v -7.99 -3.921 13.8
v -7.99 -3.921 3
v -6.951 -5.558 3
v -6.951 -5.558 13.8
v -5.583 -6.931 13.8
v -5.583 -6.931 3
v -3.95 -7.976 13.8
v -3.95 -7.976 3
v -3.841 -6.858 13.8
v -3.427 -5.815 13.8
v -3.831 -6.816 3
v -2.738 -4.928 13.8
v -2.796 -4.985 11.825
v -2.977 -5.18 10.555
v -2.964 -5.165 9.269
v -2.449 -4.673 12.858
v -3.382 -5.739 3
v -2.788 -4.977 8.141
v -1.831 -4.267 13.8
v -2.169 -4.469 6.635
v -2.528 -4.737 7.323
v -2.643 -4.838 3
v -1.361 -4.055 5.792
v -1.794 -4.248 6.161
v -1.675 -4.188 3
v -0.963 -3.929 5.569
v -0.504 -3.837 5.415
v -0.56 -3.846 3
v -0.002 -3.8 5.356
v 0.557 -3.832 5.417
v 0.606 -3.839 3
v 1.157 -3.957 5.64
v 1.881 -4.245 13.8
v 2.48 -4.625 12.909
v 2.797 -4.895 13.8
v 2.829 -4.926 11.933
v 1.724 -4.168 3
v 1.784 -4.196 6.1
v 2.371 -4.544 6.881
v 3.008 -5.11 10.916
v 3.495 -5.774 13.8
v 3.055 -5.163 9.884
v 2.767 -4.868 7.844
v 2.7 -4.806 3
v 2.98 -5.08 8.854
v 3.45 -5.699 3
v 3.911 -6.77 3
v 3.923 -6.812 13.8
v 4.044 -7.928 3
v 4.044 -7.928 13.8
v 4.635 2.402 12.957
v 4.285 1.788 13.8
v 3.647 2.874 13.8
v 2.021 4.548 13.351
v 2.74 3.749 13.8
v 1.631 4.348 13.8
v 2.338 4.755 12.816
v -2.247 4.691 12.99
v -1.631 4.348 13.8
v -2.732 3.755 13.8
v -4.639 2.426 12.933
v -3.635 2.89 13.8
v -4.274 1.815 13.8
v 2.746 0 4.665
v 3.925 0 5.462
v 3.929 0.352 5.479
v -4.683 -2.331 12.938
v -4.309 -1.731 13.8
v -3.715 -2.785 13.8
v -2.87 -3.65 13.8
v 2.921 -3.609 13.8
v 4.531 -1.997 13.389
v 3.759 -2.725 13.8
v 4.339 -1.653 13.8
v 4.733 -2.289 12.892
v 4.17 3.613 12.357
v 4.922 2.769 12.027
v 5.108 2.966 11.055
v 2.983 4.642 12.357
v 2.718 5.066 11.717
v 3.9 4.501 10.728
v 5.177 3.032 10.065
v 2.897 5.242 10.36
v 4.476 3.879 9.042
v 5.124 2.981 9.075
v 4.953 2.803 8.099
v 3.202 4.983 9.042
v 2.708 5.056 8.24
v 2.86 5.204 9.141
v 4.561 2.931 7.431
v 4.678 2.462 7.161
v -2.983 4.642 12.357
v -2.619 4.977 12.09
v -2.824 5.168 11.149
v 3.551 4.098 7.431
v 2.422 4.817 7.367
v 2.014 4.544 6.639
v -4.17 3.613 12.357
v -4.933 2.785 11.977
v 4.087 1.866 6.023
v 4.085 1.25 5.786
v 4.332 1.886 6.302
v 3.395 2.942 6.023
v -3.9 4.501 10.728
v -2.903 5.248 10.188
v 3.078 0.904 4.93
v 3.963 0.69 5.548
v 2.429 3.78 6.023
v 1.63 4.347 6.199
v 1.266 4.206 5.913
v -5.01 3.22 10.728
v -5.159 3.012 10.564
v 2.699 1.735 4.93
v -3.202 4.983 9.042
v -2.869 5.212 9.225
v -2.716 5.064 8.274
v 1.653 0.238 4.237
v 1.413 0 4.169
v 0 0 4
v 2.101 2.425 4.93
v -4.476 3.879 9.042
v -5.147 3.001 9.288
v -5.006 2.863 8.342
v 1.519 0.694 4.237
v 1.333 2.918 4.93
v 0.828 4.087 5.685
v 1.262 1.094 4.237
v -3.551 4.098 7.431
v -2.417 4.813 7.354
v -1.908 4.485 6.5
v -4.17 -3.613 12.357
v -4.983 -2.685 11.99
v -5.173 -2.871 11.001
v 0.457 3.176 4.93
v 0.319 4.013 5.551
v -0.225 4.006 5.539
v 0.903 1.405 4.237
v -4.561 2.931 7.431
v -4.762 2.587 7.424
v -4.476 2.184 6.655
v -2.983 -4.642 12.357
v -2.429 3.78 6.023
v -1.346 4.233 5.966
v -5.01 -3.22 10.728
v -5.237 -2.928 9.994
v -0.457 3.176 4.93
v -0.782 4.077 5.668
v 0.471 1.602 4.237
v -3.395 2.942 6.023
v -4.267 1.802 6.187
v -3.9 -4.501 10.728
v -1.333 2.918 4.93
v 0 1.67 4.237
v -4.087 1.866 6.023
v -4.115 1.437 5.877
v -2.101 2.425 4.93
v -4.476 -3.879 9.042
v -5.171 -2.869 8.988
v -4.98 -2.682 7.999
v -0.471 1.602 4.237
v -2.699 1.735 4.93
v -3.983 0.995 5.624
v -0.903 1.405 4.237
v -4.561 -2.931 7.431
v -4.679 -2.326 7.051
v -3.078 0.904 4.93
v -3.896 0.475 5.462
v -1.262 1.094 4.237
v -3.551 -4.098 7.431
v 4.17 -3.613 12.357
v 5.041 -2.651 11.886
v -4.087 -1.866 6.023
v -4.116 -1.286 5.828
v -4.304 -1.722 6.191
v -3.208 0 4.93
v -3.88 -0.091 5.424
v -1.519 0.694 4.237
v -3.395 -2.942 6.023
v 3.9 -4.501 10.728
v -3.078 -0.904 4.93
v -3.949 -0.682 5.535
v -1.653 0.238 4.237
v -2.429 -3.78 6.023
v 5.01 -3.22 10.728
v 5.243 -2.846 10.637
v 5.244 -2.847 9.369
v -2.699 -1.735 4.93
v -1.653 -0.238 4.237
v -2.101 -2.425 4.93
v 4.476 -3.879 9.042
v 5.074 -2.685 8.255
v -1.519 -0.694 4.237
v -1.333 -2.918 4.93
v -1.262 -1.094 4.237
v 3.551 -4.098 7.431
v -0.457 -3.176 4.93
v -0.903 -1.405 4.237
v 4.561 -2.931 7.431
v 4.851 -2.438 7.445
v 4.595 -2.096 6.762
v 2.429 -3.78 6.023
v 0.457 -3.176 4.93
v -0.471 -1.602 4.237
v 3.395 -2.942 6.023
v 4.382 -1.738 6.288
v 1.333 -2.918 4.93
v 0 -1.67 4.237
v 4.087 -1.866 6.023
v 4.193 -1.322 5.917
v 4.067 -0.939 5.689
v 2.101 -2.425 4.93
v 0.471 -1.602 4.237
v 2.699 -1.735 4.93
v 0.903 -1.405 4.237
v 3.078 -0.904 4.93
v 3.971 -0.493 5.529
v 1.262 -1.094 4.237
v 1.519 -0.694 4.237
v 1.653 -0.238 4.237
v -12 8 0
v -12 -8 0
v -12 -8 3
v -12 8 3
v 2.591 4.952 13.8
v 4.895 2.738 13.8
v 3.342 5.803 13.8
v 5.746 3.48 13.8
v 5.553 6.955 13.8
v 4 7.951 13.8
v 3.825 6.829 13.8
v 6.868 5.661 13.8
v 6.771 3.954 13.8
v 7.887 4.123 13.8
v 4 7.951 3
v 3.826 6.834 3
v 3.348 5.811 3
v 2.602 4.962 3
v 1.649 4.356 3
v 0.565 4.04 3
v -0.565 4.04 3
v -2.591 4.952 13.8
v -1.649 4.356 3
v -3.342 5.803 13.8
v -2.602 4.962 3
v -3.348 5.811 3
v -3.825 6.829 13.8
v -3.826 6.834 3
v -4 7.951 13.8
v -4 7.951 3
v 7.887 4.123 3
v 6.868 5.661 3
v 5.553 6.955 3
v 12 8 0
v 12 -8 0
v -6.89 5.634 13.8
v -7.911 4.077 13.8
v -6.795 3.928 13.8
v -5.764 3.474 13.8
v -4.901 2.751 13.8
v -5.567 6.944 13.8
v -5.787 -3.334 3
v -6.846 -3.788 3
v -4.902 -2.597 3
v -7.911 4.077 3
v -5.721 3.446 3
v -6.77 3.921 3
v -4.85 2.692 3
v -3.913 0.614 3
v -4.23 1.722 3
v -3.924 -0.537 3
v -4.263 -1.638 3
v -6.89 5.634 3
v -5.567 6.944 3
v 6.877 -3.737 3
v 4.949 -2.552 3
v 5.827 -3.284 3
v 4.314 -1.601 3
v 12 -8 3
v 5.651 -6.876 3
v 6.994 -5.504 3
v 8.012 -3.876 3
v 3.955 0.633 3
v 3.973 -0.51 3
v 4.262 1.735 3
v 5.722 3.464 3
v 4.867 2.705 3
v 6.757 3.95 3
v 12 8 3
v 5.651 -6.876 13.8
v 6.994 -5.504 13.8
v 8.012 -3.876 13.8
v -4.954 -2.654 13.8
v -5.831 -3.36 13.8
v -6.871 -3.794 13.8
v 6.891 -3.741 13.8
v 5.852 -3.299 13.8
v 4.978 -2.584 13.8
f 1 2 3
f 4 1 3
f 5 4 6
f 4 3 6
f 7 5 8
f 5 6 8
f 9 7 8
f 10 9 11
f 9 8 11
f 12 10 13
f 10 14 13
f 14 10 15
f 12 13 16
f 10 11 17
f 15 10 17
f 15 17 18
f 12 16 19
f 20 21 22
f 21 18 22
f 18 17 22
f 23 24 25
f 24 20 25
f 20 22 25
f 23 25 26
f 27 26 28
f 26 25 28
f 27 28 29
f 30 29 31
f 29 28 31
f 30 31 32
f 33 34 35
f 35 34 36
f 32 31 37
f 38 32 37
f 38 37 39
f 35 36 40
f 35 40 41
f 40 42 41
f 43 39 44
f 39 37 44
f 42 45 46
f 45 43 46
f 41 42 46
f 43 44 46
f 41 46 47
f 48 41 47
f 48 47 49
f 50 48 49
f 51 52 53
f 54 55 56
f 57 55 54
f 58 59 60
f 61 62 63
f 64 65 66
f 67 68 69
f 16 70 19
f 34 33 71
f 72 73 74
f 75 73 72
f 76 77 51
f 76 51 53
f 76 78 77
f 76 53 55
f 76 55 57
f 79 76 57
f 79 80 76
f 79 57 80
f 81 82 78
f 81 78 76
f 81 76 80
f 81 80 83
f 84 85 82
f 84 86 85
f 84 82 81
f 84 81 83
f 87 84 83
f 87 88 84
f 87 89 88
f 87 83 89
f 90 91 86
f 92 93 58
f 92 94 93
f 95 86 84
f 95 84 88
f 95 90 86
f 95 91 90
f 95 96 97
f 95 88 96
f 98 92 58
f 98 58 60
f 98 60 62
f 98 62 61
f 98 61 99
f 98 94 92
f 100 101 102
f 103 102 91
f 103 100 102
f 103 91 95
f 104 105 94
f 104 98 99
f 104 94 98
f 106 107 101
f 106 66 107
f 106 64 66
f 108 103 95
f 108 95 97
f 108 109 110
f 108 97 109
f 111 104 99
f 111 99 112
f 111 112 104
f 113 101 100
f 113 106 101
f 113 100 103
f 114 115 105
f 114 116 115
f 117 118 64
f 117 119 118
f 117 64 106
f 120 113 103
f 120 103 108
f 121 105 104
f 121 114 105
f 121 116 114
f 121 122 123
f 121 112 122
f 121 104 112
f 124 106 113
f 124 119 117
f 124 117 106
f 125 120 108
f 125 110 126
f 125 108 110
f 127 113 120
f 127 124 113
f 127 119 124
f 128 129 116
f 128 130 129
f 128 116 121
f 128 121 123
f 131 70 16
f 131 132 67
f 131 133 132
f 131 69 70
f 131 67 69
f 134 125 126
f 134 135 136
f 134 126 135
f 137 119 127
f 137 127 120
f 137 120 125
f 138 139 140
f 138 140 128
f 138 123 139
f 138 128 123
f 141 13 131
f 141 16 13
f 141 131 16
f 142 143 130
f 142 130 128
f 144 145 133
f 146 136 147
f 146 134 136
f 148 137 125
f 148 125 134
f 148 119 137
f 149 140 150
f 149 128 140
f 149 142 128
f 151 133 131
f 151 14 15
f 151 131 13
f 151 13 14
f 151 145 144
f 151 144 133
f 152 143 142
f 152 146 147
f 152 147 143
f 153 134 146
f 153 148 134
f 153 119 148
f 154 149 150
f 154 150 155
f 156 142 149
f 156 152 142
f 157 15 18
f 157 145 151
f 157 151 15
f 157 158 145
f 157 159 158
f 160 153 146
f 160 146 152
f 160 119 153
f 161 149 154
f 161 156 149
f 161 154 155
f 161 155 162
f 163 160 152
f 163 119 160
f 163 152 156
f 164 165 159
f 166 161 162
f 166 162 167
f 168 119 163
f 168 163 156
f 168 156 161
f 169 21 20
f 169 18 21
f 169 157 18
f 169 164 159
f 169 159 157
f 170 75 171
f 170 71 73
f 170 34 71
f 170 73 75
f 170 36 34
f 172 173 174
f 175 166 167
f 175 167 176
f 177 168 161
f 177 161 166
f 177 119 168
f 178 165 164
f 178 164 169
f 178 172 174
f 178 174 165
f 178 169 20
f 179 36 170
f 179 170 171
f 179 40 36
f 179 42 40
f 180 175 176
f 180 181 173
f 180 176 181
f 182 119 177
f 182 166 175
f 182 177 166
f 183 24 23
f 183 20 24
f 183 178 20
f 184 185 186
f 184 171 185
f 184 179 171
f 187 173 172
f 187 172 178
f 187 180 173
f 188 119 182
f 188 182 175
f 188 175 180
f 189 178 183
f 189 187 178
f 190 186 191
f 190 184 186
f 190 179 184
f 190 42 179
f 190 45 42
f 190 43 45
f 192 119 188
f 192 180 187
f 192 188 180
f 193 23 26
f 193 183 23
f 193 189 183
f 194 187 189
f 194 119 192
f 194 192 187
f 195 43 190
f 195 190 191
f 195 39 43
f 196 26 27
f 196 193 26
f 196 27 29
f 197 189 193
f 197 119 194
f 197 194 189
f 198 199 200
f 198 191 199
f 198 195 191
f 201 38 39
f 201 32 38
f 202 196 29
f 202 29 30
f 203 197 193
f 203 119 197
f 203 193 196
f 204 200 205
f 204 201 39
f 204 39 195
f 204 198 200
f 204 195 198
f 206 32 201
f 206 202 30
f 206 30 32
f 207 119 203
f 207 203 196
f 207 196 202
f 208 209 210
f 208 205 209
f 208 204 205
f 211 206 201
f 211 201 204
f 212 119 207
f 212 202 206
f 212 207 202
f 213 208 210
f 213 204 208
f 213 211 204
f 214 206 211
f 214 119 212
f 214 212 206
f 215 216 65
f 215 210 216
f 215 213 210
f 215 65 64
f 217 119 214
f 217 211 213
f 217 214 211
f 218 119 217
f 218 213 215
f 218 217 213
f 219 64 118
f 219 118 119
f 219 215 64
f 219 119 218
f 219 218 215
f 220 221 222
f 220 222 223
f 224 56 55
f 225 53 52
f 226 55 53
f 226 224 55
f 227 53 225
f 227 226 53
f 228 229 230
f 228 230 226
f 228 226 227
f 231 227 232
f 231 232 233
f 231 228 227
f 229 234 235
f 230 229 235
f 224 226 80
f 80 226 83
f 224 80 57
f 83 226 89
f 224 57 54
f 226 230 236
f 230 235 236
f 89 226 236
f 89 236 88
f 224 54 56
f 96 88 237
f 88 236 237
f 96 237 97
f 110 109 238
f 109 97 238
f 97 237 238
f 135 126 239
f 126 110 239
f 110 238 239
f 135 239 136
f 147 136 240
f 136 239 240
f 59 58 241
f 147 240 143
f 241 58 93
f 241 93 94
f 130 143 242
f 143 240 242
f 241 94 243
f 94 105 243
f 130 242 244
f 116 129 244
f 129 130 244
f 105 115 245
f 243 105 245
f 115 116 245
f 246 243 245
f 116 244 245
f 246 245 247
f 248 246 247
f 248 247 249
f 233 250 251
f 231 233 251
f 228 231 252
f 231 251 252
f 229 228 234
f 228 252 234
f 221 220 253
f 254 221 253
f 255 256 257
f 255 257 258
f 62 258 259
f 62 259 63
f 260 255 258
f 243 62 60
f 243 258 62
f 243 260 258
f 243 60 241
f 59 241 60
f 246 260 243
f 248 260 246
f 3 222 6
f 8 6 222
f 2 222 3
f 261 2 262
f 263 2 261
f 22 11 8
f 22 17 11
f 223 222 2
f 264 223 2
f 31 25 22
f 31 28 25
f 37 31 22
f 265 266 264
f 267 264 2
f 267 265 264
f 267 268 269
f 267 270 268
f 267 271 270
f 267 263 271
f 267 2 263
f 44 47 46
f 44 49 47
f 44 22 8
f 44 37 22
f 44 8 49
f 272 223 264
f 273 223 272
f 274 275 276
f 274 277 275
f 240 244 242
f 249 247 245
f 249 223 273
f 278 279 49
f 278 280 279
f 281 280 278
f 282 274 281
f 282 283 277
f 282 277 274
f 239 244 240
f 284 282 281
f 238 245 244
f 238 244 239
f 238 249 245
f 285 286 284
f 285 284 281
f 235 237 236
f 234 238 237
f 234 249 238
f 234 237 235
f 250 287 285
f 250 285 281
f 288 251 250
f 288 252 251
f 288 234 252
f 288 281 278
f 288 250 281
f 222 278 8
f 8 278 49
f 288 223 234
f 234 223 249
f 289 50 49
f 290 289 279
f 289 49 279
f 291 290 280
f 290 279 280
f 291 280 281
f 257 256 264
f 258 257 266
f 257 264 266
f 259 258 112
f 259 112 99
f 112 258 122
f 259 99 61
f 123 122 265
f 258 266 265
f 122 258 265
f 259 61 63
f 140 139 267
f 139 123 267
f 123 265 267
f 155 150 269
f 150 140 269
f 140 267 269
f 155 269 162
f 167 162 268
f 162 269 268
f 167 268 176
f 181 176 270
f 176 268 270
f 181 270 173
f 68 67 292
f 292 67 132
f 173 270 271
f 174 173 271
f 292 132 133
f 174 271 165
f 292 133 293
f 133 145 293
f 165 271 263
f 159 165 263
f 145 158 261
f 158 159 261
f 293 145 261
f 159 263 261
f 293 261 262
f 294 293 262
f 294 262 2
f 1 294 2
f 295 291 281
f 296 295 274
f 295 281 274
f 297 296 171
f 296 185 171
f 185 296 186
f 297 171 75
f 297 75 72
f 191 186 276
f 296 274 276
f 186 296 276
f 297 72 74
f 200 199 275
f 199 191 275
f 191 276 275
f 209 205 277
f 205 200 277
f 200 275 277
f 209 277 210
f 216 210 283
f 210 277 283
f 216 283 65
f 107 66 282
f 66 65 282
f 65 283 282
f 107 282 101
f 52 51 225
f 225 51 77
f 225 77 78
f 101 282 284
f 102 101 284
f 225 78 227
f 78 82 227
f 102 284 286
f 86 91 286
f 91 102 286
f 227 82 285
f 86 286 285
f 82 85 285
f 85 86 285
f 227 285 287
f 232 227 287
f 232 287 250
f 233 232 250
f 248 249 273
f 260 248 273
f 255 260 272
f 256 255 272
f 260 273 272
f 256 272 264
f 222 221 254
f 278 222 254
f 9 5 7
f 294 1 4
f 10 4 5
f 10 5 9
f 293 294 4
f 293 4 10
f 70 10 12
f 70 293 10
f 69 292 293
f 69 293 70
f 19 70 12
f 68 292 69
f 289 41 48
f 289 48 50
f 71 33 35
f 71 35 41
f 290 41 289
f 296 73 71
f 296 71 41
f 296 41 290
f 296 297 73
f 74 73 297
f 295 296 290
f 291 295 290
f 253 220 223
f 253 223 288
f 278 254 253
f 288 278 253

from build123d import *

# Parameters (mm, degrees)
SKIZZE1_W                       = 24
SKIZZE1_H                       = 16
AUFSATZ_LINEAR_AUSTRAGEN1_DEPTH = 3
AUFSATZ_LINEAR_AUSTRAGEN2_DEPTH = 10.8


with BuildPart() as part:
    # Skizze1 → Aufsatz-Linear austragen1 (new body)
    with BuildSketch(Plane.XY):
        Rectangle(SKIZZE1_W, SKIZZE1_H)
    extrude(amount=AUFSATZ_LINEAR_AUSTRAGEN1_DEPTH)

    # Skizze2 → Aufsatz-Linear austragen2 (add)
    with BuildSketch(Plane.XY.offset(3)):
        with BuildLine():
            ThreePointArc((-3.999695252, 7.950625), (-6.26249607, 6.323855072), (-7.911250653, 4.077022578))
            ThreePointArc((-7.911250653, 4.077022578), (-3.876728126, 0.037983649), (-7.989616413, -3.92122807))
            ThreePointArc((-7.989616413, -3.92122807), (-6.304514257, -6.281966252), (-3.949828748, -7.975515837))
            ThreePointArc((-3.949828748, -7.975515837), (0.022550329, -3.799433377), (4.044219423, -7.928069706))
            ThreePointArc((4.044219423, -7.928069706), (6.359488738, -6.226307332), (8.011875714, -3.875544807))
            ThreePointArc((8.011875714, -3.875544807), (3.923312373, 0.061138188), (7.88722716, 4.123305437))
            ThreePointArc((7.88722716, 4.123305437), (6.243943055, 6.342174322), (3.999695252, 7.950625))
            ThreePointArc((3.999695252, 7.950625), (0, 4), (-3.999695252, 7.950625))
        make_face()
    extrude(amount=AUFSATZ_LINEAR_AUSTRAGEN2_DEPTH)

    # Skizze3 → Schnitt-Rotation1 (revolve, cut)
    with BuildSketch(Plane(origin=(0, 0, 0), x_dir=(1, 0, 0), z_dir=(0, 1, 0))):
        with BuildLine():
            Line((0, -4), (0, -16))
            ThreePointArc((0, -16), (6, -10), (0, -4))
        make_face()
    revolve(axis=Axis((0, 0, 4), (0, 0, 1)), mode=Mode.SUBTRACT)


solid = part.part
